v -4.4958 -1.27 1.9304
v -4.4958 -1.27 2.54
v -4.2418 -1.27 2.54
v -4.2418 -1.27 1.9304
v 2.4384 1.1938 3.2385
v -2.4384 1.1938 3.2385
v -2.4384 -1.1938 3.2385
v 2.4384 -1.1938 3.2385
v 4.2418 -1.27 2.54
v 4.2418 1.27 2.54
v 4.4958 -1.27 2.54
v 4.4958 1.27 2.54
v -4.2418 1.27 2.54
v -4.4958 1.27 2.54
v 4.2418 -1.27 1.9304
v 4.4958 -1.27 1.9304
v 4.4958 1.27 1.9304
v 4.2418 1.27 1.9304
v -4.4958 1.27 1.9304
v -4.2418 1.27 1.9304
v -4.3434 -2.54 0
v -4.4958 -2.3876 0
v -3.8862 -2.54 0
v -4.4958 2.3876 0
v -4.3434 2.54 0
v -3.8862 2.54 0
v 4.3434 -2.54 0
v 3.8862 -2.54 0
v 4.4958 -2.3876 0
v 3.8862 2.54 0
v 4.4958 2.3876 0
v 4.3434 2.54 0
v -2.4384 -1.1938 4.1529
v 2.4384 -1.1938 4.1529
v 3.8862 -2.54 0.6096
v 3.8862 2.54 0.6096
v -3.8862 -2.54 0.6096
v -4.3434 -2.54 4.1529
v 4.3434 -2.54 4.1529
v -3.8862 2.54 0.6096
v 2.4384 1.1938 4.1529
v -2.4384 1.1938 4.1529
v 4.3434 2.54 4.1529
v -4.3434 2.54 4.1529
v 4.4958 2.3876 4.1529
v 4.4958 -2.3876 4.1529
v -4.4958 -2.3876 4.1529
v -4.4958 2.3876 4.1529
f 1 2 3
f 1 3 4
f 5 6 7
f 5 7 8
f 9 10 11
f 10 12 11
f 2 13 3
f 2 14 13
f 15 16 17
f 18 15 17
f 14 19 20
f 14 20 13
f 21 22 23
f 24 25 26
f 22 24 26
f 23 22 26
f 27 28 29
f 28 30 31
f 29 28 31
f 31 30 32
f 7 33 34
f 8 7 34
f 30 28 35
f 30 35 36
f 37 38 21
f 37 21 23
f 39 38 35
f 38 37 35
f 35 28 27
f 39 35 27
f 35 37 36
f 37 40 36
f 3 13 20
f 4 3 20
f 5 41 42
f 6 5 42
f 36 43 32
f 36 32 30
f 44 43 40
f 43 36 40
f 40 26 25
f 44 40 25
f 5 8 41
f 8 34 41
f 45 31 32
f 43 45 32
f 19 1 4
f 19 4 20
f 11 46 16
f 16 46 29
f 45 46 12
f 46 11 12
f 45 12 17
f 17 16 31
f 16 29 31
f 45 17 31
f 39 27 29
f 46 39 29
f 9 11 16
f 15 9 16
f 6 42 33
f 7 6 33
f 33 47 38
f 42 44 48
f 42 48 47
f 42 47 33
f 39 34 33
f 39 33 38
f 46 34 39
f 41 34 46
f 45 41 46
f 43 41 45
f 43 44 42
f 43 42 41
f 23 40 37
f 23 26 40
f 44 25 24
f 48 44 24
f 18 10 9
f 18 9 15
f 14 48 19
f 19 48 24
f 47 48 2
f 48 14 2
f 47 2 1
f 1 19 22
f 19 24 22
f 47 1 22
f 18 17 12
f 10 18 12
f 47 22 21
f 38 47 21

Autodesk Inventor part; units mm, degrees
sketch "Sketch_1" plane through (0, 0, 0) normal (0, 0, 1) x (1, 0, 0)
  line L0 (-4.4958, -2.3876) -> (-4.3434, -2.54)
  line L1 (-4.3434, -2.54) -> (4.3434, -2.54)
  line L2 (4.3434, -2.54) -> (4.4958, -2.3876)
  line L3 (4.4958, -2.3876) -> (4.4958, 2.3876)
  line L4 (4.4958, 2.3876) -> (4.3434, 2.54)
  line L5 (4.3434, 2.54) -> (-4.3434, 2.54)
  line L6 (-4.3434, 2.54) -> (-4.4958, 2.3876)
  line L7 (-4.4958, 2.3876) -> (-4.4958, -2.3876)
extrude "Extrusion1" add sketch "Sketch_1" along normal blind 4.1529
sketch "Sketch_5" plane through (0, 0, 4.1529) normal (0, 0, 1) x (1, 0, 0)
  line L0 (-2.4384, 1.1938) -> (-2.4384, -1.1938)
  line L1 (-2.4384, -1.1938) -> (2.4384, -1.1938)
  line L2 (2.4384, -1.1938) -> (2.4384, 1.1938)
  line L3 (2.4384, 1.1938) -> (-2.4384, 1.1938)
extrude "Extrusion2" cut sketch "Sketch_5" against normal blind 0.9144
sketch "Sketch_4" plane through (4.4958, 0, 0) normal (1, 0, 0) x (0, 0, -1)
  line L0 (-2.54, 1.27) -> (-2.54, -1.27)
  line L1 (-2.54, -1.27) -> (-1.9304, -1.27)
  line L2 (-1.9304, -1.27) -> (-1.9304, 1.27)
  line L3 (-1.9304, 1.27) -> (-2.54, 1.27)
extrude "Extrusion3" cut sketch "Sketch_4" against normal blind 0.254
sketch "Sketch_6" plane through (-4.4958, 0, 0) normal (1, 0, 0) x (0, 0, -1)
  line L0 (-2.54, 1.27) -> (-2.54, -1.27)
  line L1 (-2.54, -1.27) -> (-1.9304, -1.27)
  line L2 (-1.9304, -1.27) -> (-1.9304, 1.27)
  line L3 (-1.9304, 1.27) -> (-2.54, 1.27)
extrude "Extrusion4" cut sketch "Sketch_6" along normal blind 0.254
sketch "Sketch_2" plane through (0, 0, 0) normal (0, 0, 1) x (1, 0, 0)
  line L0 (-3.8862, 2.54) -> (-3.8862, -2.54)
  line L1 (-3.8862, -2.54) -> (3.8862, -2.54)
  line L2 (3.8862, -2.54) -> (3.8862, 2.54)
  line L3 (3.8862, 2.54) -> (-3.8862, 2.54)
extrude "Extrusion5" cut sketch "Sketch_2" along normal blind 0.6096
ref_plane "actu_a_right_XY" through (-0.0508, 0, 3.2385) normal (0, 0, -1) x (1, 0, 0)
ref_plane "actu_a_right_YZ" through (-0.0508, 0, 3.2385) normal (1, 0, 0) x (0, -1, 0)
ref_plane "actu_a_right_ZX" through (-0.0508, 0, 3.2385) normal (0, -1, 0) x (0, 0, -1)
ref_plane "body12_right_XY" through (0, 0, 0.6096) normal (0, 0, 1) x (1, 0, 0)
ref_plane "body12_right_YZ" through (0, 0, 0.6096) normal (1, 0, 0) x (0, 1, 0)
ref_plane "body12_right_ZX" through (0, 0, 0.6096) normal (0, 1, 0) x (0, 0, 1)
properties part number "AS11CHright1"
